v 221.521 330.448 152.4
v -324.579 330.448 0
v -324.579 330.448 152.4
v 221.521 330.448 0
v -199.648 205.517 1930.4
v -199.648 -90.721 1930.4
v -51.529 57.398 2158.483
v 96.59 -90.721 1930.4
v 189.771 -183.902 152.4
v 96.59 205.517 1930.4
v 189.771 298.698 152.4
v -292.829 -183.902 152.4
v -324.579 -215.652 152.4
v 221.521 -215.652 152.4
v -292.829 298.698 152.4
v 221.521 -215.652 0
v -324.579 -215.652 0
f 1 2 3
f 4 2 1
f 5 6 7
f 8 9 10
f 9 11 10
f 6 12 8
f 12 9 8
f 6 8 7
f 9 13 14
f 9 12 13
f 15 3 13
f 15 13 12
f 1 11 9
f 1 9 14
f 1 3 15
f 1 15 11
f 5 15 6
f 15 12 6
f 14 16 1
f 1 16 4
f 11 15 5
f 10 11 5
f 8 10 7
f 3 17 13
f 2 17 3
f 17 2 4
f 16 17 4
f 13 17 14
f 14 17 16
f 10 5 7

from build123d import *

# Parameters (mm, degrees)
F0_W     = 546.1
F0_H     = 546.1
F1_DEPTH = 152.4
F2_W     = 482.6
F2_H     = 482.6
F3_DEPTH = 1778
F3_TAPER = 3
F4_W     = 296.2379368695
F4_H     = 296.2379368695
F5_DEPTH = 241.3
F5_TAPER = 33


with BuildPart() as f1:
    # F0 (on Top) → F1 (new body)
    with BuildSketch(Plane.XY):
        with Locations((-51.5293031931, 57.3979665157)):
            Rectangle(F0_W, F0_H)
    extrude(amount=F1_DEPTH)

    # F2 (on face) → F3 (join)
    with BuildSketch(Plane.XY.offset(152.4)):
        with Locations((-51.5293031931, 57.3979665157)):
            Rectangle(F2_W, F2_H)
    extrude(amount=F3_DEPTH, taper=F3_TAPER)

    # F4 (on face) → F5 (join)
    with BuildSketch(Plane.XY.offset(1930.4)):
        with Locations((-51.5293031931, 57.3979665157)):
            Rectangle(F4_W, F4_H)
    extrude(amount=F5_DEPTH, taper=F5_TAPER)


solid = f1.part
